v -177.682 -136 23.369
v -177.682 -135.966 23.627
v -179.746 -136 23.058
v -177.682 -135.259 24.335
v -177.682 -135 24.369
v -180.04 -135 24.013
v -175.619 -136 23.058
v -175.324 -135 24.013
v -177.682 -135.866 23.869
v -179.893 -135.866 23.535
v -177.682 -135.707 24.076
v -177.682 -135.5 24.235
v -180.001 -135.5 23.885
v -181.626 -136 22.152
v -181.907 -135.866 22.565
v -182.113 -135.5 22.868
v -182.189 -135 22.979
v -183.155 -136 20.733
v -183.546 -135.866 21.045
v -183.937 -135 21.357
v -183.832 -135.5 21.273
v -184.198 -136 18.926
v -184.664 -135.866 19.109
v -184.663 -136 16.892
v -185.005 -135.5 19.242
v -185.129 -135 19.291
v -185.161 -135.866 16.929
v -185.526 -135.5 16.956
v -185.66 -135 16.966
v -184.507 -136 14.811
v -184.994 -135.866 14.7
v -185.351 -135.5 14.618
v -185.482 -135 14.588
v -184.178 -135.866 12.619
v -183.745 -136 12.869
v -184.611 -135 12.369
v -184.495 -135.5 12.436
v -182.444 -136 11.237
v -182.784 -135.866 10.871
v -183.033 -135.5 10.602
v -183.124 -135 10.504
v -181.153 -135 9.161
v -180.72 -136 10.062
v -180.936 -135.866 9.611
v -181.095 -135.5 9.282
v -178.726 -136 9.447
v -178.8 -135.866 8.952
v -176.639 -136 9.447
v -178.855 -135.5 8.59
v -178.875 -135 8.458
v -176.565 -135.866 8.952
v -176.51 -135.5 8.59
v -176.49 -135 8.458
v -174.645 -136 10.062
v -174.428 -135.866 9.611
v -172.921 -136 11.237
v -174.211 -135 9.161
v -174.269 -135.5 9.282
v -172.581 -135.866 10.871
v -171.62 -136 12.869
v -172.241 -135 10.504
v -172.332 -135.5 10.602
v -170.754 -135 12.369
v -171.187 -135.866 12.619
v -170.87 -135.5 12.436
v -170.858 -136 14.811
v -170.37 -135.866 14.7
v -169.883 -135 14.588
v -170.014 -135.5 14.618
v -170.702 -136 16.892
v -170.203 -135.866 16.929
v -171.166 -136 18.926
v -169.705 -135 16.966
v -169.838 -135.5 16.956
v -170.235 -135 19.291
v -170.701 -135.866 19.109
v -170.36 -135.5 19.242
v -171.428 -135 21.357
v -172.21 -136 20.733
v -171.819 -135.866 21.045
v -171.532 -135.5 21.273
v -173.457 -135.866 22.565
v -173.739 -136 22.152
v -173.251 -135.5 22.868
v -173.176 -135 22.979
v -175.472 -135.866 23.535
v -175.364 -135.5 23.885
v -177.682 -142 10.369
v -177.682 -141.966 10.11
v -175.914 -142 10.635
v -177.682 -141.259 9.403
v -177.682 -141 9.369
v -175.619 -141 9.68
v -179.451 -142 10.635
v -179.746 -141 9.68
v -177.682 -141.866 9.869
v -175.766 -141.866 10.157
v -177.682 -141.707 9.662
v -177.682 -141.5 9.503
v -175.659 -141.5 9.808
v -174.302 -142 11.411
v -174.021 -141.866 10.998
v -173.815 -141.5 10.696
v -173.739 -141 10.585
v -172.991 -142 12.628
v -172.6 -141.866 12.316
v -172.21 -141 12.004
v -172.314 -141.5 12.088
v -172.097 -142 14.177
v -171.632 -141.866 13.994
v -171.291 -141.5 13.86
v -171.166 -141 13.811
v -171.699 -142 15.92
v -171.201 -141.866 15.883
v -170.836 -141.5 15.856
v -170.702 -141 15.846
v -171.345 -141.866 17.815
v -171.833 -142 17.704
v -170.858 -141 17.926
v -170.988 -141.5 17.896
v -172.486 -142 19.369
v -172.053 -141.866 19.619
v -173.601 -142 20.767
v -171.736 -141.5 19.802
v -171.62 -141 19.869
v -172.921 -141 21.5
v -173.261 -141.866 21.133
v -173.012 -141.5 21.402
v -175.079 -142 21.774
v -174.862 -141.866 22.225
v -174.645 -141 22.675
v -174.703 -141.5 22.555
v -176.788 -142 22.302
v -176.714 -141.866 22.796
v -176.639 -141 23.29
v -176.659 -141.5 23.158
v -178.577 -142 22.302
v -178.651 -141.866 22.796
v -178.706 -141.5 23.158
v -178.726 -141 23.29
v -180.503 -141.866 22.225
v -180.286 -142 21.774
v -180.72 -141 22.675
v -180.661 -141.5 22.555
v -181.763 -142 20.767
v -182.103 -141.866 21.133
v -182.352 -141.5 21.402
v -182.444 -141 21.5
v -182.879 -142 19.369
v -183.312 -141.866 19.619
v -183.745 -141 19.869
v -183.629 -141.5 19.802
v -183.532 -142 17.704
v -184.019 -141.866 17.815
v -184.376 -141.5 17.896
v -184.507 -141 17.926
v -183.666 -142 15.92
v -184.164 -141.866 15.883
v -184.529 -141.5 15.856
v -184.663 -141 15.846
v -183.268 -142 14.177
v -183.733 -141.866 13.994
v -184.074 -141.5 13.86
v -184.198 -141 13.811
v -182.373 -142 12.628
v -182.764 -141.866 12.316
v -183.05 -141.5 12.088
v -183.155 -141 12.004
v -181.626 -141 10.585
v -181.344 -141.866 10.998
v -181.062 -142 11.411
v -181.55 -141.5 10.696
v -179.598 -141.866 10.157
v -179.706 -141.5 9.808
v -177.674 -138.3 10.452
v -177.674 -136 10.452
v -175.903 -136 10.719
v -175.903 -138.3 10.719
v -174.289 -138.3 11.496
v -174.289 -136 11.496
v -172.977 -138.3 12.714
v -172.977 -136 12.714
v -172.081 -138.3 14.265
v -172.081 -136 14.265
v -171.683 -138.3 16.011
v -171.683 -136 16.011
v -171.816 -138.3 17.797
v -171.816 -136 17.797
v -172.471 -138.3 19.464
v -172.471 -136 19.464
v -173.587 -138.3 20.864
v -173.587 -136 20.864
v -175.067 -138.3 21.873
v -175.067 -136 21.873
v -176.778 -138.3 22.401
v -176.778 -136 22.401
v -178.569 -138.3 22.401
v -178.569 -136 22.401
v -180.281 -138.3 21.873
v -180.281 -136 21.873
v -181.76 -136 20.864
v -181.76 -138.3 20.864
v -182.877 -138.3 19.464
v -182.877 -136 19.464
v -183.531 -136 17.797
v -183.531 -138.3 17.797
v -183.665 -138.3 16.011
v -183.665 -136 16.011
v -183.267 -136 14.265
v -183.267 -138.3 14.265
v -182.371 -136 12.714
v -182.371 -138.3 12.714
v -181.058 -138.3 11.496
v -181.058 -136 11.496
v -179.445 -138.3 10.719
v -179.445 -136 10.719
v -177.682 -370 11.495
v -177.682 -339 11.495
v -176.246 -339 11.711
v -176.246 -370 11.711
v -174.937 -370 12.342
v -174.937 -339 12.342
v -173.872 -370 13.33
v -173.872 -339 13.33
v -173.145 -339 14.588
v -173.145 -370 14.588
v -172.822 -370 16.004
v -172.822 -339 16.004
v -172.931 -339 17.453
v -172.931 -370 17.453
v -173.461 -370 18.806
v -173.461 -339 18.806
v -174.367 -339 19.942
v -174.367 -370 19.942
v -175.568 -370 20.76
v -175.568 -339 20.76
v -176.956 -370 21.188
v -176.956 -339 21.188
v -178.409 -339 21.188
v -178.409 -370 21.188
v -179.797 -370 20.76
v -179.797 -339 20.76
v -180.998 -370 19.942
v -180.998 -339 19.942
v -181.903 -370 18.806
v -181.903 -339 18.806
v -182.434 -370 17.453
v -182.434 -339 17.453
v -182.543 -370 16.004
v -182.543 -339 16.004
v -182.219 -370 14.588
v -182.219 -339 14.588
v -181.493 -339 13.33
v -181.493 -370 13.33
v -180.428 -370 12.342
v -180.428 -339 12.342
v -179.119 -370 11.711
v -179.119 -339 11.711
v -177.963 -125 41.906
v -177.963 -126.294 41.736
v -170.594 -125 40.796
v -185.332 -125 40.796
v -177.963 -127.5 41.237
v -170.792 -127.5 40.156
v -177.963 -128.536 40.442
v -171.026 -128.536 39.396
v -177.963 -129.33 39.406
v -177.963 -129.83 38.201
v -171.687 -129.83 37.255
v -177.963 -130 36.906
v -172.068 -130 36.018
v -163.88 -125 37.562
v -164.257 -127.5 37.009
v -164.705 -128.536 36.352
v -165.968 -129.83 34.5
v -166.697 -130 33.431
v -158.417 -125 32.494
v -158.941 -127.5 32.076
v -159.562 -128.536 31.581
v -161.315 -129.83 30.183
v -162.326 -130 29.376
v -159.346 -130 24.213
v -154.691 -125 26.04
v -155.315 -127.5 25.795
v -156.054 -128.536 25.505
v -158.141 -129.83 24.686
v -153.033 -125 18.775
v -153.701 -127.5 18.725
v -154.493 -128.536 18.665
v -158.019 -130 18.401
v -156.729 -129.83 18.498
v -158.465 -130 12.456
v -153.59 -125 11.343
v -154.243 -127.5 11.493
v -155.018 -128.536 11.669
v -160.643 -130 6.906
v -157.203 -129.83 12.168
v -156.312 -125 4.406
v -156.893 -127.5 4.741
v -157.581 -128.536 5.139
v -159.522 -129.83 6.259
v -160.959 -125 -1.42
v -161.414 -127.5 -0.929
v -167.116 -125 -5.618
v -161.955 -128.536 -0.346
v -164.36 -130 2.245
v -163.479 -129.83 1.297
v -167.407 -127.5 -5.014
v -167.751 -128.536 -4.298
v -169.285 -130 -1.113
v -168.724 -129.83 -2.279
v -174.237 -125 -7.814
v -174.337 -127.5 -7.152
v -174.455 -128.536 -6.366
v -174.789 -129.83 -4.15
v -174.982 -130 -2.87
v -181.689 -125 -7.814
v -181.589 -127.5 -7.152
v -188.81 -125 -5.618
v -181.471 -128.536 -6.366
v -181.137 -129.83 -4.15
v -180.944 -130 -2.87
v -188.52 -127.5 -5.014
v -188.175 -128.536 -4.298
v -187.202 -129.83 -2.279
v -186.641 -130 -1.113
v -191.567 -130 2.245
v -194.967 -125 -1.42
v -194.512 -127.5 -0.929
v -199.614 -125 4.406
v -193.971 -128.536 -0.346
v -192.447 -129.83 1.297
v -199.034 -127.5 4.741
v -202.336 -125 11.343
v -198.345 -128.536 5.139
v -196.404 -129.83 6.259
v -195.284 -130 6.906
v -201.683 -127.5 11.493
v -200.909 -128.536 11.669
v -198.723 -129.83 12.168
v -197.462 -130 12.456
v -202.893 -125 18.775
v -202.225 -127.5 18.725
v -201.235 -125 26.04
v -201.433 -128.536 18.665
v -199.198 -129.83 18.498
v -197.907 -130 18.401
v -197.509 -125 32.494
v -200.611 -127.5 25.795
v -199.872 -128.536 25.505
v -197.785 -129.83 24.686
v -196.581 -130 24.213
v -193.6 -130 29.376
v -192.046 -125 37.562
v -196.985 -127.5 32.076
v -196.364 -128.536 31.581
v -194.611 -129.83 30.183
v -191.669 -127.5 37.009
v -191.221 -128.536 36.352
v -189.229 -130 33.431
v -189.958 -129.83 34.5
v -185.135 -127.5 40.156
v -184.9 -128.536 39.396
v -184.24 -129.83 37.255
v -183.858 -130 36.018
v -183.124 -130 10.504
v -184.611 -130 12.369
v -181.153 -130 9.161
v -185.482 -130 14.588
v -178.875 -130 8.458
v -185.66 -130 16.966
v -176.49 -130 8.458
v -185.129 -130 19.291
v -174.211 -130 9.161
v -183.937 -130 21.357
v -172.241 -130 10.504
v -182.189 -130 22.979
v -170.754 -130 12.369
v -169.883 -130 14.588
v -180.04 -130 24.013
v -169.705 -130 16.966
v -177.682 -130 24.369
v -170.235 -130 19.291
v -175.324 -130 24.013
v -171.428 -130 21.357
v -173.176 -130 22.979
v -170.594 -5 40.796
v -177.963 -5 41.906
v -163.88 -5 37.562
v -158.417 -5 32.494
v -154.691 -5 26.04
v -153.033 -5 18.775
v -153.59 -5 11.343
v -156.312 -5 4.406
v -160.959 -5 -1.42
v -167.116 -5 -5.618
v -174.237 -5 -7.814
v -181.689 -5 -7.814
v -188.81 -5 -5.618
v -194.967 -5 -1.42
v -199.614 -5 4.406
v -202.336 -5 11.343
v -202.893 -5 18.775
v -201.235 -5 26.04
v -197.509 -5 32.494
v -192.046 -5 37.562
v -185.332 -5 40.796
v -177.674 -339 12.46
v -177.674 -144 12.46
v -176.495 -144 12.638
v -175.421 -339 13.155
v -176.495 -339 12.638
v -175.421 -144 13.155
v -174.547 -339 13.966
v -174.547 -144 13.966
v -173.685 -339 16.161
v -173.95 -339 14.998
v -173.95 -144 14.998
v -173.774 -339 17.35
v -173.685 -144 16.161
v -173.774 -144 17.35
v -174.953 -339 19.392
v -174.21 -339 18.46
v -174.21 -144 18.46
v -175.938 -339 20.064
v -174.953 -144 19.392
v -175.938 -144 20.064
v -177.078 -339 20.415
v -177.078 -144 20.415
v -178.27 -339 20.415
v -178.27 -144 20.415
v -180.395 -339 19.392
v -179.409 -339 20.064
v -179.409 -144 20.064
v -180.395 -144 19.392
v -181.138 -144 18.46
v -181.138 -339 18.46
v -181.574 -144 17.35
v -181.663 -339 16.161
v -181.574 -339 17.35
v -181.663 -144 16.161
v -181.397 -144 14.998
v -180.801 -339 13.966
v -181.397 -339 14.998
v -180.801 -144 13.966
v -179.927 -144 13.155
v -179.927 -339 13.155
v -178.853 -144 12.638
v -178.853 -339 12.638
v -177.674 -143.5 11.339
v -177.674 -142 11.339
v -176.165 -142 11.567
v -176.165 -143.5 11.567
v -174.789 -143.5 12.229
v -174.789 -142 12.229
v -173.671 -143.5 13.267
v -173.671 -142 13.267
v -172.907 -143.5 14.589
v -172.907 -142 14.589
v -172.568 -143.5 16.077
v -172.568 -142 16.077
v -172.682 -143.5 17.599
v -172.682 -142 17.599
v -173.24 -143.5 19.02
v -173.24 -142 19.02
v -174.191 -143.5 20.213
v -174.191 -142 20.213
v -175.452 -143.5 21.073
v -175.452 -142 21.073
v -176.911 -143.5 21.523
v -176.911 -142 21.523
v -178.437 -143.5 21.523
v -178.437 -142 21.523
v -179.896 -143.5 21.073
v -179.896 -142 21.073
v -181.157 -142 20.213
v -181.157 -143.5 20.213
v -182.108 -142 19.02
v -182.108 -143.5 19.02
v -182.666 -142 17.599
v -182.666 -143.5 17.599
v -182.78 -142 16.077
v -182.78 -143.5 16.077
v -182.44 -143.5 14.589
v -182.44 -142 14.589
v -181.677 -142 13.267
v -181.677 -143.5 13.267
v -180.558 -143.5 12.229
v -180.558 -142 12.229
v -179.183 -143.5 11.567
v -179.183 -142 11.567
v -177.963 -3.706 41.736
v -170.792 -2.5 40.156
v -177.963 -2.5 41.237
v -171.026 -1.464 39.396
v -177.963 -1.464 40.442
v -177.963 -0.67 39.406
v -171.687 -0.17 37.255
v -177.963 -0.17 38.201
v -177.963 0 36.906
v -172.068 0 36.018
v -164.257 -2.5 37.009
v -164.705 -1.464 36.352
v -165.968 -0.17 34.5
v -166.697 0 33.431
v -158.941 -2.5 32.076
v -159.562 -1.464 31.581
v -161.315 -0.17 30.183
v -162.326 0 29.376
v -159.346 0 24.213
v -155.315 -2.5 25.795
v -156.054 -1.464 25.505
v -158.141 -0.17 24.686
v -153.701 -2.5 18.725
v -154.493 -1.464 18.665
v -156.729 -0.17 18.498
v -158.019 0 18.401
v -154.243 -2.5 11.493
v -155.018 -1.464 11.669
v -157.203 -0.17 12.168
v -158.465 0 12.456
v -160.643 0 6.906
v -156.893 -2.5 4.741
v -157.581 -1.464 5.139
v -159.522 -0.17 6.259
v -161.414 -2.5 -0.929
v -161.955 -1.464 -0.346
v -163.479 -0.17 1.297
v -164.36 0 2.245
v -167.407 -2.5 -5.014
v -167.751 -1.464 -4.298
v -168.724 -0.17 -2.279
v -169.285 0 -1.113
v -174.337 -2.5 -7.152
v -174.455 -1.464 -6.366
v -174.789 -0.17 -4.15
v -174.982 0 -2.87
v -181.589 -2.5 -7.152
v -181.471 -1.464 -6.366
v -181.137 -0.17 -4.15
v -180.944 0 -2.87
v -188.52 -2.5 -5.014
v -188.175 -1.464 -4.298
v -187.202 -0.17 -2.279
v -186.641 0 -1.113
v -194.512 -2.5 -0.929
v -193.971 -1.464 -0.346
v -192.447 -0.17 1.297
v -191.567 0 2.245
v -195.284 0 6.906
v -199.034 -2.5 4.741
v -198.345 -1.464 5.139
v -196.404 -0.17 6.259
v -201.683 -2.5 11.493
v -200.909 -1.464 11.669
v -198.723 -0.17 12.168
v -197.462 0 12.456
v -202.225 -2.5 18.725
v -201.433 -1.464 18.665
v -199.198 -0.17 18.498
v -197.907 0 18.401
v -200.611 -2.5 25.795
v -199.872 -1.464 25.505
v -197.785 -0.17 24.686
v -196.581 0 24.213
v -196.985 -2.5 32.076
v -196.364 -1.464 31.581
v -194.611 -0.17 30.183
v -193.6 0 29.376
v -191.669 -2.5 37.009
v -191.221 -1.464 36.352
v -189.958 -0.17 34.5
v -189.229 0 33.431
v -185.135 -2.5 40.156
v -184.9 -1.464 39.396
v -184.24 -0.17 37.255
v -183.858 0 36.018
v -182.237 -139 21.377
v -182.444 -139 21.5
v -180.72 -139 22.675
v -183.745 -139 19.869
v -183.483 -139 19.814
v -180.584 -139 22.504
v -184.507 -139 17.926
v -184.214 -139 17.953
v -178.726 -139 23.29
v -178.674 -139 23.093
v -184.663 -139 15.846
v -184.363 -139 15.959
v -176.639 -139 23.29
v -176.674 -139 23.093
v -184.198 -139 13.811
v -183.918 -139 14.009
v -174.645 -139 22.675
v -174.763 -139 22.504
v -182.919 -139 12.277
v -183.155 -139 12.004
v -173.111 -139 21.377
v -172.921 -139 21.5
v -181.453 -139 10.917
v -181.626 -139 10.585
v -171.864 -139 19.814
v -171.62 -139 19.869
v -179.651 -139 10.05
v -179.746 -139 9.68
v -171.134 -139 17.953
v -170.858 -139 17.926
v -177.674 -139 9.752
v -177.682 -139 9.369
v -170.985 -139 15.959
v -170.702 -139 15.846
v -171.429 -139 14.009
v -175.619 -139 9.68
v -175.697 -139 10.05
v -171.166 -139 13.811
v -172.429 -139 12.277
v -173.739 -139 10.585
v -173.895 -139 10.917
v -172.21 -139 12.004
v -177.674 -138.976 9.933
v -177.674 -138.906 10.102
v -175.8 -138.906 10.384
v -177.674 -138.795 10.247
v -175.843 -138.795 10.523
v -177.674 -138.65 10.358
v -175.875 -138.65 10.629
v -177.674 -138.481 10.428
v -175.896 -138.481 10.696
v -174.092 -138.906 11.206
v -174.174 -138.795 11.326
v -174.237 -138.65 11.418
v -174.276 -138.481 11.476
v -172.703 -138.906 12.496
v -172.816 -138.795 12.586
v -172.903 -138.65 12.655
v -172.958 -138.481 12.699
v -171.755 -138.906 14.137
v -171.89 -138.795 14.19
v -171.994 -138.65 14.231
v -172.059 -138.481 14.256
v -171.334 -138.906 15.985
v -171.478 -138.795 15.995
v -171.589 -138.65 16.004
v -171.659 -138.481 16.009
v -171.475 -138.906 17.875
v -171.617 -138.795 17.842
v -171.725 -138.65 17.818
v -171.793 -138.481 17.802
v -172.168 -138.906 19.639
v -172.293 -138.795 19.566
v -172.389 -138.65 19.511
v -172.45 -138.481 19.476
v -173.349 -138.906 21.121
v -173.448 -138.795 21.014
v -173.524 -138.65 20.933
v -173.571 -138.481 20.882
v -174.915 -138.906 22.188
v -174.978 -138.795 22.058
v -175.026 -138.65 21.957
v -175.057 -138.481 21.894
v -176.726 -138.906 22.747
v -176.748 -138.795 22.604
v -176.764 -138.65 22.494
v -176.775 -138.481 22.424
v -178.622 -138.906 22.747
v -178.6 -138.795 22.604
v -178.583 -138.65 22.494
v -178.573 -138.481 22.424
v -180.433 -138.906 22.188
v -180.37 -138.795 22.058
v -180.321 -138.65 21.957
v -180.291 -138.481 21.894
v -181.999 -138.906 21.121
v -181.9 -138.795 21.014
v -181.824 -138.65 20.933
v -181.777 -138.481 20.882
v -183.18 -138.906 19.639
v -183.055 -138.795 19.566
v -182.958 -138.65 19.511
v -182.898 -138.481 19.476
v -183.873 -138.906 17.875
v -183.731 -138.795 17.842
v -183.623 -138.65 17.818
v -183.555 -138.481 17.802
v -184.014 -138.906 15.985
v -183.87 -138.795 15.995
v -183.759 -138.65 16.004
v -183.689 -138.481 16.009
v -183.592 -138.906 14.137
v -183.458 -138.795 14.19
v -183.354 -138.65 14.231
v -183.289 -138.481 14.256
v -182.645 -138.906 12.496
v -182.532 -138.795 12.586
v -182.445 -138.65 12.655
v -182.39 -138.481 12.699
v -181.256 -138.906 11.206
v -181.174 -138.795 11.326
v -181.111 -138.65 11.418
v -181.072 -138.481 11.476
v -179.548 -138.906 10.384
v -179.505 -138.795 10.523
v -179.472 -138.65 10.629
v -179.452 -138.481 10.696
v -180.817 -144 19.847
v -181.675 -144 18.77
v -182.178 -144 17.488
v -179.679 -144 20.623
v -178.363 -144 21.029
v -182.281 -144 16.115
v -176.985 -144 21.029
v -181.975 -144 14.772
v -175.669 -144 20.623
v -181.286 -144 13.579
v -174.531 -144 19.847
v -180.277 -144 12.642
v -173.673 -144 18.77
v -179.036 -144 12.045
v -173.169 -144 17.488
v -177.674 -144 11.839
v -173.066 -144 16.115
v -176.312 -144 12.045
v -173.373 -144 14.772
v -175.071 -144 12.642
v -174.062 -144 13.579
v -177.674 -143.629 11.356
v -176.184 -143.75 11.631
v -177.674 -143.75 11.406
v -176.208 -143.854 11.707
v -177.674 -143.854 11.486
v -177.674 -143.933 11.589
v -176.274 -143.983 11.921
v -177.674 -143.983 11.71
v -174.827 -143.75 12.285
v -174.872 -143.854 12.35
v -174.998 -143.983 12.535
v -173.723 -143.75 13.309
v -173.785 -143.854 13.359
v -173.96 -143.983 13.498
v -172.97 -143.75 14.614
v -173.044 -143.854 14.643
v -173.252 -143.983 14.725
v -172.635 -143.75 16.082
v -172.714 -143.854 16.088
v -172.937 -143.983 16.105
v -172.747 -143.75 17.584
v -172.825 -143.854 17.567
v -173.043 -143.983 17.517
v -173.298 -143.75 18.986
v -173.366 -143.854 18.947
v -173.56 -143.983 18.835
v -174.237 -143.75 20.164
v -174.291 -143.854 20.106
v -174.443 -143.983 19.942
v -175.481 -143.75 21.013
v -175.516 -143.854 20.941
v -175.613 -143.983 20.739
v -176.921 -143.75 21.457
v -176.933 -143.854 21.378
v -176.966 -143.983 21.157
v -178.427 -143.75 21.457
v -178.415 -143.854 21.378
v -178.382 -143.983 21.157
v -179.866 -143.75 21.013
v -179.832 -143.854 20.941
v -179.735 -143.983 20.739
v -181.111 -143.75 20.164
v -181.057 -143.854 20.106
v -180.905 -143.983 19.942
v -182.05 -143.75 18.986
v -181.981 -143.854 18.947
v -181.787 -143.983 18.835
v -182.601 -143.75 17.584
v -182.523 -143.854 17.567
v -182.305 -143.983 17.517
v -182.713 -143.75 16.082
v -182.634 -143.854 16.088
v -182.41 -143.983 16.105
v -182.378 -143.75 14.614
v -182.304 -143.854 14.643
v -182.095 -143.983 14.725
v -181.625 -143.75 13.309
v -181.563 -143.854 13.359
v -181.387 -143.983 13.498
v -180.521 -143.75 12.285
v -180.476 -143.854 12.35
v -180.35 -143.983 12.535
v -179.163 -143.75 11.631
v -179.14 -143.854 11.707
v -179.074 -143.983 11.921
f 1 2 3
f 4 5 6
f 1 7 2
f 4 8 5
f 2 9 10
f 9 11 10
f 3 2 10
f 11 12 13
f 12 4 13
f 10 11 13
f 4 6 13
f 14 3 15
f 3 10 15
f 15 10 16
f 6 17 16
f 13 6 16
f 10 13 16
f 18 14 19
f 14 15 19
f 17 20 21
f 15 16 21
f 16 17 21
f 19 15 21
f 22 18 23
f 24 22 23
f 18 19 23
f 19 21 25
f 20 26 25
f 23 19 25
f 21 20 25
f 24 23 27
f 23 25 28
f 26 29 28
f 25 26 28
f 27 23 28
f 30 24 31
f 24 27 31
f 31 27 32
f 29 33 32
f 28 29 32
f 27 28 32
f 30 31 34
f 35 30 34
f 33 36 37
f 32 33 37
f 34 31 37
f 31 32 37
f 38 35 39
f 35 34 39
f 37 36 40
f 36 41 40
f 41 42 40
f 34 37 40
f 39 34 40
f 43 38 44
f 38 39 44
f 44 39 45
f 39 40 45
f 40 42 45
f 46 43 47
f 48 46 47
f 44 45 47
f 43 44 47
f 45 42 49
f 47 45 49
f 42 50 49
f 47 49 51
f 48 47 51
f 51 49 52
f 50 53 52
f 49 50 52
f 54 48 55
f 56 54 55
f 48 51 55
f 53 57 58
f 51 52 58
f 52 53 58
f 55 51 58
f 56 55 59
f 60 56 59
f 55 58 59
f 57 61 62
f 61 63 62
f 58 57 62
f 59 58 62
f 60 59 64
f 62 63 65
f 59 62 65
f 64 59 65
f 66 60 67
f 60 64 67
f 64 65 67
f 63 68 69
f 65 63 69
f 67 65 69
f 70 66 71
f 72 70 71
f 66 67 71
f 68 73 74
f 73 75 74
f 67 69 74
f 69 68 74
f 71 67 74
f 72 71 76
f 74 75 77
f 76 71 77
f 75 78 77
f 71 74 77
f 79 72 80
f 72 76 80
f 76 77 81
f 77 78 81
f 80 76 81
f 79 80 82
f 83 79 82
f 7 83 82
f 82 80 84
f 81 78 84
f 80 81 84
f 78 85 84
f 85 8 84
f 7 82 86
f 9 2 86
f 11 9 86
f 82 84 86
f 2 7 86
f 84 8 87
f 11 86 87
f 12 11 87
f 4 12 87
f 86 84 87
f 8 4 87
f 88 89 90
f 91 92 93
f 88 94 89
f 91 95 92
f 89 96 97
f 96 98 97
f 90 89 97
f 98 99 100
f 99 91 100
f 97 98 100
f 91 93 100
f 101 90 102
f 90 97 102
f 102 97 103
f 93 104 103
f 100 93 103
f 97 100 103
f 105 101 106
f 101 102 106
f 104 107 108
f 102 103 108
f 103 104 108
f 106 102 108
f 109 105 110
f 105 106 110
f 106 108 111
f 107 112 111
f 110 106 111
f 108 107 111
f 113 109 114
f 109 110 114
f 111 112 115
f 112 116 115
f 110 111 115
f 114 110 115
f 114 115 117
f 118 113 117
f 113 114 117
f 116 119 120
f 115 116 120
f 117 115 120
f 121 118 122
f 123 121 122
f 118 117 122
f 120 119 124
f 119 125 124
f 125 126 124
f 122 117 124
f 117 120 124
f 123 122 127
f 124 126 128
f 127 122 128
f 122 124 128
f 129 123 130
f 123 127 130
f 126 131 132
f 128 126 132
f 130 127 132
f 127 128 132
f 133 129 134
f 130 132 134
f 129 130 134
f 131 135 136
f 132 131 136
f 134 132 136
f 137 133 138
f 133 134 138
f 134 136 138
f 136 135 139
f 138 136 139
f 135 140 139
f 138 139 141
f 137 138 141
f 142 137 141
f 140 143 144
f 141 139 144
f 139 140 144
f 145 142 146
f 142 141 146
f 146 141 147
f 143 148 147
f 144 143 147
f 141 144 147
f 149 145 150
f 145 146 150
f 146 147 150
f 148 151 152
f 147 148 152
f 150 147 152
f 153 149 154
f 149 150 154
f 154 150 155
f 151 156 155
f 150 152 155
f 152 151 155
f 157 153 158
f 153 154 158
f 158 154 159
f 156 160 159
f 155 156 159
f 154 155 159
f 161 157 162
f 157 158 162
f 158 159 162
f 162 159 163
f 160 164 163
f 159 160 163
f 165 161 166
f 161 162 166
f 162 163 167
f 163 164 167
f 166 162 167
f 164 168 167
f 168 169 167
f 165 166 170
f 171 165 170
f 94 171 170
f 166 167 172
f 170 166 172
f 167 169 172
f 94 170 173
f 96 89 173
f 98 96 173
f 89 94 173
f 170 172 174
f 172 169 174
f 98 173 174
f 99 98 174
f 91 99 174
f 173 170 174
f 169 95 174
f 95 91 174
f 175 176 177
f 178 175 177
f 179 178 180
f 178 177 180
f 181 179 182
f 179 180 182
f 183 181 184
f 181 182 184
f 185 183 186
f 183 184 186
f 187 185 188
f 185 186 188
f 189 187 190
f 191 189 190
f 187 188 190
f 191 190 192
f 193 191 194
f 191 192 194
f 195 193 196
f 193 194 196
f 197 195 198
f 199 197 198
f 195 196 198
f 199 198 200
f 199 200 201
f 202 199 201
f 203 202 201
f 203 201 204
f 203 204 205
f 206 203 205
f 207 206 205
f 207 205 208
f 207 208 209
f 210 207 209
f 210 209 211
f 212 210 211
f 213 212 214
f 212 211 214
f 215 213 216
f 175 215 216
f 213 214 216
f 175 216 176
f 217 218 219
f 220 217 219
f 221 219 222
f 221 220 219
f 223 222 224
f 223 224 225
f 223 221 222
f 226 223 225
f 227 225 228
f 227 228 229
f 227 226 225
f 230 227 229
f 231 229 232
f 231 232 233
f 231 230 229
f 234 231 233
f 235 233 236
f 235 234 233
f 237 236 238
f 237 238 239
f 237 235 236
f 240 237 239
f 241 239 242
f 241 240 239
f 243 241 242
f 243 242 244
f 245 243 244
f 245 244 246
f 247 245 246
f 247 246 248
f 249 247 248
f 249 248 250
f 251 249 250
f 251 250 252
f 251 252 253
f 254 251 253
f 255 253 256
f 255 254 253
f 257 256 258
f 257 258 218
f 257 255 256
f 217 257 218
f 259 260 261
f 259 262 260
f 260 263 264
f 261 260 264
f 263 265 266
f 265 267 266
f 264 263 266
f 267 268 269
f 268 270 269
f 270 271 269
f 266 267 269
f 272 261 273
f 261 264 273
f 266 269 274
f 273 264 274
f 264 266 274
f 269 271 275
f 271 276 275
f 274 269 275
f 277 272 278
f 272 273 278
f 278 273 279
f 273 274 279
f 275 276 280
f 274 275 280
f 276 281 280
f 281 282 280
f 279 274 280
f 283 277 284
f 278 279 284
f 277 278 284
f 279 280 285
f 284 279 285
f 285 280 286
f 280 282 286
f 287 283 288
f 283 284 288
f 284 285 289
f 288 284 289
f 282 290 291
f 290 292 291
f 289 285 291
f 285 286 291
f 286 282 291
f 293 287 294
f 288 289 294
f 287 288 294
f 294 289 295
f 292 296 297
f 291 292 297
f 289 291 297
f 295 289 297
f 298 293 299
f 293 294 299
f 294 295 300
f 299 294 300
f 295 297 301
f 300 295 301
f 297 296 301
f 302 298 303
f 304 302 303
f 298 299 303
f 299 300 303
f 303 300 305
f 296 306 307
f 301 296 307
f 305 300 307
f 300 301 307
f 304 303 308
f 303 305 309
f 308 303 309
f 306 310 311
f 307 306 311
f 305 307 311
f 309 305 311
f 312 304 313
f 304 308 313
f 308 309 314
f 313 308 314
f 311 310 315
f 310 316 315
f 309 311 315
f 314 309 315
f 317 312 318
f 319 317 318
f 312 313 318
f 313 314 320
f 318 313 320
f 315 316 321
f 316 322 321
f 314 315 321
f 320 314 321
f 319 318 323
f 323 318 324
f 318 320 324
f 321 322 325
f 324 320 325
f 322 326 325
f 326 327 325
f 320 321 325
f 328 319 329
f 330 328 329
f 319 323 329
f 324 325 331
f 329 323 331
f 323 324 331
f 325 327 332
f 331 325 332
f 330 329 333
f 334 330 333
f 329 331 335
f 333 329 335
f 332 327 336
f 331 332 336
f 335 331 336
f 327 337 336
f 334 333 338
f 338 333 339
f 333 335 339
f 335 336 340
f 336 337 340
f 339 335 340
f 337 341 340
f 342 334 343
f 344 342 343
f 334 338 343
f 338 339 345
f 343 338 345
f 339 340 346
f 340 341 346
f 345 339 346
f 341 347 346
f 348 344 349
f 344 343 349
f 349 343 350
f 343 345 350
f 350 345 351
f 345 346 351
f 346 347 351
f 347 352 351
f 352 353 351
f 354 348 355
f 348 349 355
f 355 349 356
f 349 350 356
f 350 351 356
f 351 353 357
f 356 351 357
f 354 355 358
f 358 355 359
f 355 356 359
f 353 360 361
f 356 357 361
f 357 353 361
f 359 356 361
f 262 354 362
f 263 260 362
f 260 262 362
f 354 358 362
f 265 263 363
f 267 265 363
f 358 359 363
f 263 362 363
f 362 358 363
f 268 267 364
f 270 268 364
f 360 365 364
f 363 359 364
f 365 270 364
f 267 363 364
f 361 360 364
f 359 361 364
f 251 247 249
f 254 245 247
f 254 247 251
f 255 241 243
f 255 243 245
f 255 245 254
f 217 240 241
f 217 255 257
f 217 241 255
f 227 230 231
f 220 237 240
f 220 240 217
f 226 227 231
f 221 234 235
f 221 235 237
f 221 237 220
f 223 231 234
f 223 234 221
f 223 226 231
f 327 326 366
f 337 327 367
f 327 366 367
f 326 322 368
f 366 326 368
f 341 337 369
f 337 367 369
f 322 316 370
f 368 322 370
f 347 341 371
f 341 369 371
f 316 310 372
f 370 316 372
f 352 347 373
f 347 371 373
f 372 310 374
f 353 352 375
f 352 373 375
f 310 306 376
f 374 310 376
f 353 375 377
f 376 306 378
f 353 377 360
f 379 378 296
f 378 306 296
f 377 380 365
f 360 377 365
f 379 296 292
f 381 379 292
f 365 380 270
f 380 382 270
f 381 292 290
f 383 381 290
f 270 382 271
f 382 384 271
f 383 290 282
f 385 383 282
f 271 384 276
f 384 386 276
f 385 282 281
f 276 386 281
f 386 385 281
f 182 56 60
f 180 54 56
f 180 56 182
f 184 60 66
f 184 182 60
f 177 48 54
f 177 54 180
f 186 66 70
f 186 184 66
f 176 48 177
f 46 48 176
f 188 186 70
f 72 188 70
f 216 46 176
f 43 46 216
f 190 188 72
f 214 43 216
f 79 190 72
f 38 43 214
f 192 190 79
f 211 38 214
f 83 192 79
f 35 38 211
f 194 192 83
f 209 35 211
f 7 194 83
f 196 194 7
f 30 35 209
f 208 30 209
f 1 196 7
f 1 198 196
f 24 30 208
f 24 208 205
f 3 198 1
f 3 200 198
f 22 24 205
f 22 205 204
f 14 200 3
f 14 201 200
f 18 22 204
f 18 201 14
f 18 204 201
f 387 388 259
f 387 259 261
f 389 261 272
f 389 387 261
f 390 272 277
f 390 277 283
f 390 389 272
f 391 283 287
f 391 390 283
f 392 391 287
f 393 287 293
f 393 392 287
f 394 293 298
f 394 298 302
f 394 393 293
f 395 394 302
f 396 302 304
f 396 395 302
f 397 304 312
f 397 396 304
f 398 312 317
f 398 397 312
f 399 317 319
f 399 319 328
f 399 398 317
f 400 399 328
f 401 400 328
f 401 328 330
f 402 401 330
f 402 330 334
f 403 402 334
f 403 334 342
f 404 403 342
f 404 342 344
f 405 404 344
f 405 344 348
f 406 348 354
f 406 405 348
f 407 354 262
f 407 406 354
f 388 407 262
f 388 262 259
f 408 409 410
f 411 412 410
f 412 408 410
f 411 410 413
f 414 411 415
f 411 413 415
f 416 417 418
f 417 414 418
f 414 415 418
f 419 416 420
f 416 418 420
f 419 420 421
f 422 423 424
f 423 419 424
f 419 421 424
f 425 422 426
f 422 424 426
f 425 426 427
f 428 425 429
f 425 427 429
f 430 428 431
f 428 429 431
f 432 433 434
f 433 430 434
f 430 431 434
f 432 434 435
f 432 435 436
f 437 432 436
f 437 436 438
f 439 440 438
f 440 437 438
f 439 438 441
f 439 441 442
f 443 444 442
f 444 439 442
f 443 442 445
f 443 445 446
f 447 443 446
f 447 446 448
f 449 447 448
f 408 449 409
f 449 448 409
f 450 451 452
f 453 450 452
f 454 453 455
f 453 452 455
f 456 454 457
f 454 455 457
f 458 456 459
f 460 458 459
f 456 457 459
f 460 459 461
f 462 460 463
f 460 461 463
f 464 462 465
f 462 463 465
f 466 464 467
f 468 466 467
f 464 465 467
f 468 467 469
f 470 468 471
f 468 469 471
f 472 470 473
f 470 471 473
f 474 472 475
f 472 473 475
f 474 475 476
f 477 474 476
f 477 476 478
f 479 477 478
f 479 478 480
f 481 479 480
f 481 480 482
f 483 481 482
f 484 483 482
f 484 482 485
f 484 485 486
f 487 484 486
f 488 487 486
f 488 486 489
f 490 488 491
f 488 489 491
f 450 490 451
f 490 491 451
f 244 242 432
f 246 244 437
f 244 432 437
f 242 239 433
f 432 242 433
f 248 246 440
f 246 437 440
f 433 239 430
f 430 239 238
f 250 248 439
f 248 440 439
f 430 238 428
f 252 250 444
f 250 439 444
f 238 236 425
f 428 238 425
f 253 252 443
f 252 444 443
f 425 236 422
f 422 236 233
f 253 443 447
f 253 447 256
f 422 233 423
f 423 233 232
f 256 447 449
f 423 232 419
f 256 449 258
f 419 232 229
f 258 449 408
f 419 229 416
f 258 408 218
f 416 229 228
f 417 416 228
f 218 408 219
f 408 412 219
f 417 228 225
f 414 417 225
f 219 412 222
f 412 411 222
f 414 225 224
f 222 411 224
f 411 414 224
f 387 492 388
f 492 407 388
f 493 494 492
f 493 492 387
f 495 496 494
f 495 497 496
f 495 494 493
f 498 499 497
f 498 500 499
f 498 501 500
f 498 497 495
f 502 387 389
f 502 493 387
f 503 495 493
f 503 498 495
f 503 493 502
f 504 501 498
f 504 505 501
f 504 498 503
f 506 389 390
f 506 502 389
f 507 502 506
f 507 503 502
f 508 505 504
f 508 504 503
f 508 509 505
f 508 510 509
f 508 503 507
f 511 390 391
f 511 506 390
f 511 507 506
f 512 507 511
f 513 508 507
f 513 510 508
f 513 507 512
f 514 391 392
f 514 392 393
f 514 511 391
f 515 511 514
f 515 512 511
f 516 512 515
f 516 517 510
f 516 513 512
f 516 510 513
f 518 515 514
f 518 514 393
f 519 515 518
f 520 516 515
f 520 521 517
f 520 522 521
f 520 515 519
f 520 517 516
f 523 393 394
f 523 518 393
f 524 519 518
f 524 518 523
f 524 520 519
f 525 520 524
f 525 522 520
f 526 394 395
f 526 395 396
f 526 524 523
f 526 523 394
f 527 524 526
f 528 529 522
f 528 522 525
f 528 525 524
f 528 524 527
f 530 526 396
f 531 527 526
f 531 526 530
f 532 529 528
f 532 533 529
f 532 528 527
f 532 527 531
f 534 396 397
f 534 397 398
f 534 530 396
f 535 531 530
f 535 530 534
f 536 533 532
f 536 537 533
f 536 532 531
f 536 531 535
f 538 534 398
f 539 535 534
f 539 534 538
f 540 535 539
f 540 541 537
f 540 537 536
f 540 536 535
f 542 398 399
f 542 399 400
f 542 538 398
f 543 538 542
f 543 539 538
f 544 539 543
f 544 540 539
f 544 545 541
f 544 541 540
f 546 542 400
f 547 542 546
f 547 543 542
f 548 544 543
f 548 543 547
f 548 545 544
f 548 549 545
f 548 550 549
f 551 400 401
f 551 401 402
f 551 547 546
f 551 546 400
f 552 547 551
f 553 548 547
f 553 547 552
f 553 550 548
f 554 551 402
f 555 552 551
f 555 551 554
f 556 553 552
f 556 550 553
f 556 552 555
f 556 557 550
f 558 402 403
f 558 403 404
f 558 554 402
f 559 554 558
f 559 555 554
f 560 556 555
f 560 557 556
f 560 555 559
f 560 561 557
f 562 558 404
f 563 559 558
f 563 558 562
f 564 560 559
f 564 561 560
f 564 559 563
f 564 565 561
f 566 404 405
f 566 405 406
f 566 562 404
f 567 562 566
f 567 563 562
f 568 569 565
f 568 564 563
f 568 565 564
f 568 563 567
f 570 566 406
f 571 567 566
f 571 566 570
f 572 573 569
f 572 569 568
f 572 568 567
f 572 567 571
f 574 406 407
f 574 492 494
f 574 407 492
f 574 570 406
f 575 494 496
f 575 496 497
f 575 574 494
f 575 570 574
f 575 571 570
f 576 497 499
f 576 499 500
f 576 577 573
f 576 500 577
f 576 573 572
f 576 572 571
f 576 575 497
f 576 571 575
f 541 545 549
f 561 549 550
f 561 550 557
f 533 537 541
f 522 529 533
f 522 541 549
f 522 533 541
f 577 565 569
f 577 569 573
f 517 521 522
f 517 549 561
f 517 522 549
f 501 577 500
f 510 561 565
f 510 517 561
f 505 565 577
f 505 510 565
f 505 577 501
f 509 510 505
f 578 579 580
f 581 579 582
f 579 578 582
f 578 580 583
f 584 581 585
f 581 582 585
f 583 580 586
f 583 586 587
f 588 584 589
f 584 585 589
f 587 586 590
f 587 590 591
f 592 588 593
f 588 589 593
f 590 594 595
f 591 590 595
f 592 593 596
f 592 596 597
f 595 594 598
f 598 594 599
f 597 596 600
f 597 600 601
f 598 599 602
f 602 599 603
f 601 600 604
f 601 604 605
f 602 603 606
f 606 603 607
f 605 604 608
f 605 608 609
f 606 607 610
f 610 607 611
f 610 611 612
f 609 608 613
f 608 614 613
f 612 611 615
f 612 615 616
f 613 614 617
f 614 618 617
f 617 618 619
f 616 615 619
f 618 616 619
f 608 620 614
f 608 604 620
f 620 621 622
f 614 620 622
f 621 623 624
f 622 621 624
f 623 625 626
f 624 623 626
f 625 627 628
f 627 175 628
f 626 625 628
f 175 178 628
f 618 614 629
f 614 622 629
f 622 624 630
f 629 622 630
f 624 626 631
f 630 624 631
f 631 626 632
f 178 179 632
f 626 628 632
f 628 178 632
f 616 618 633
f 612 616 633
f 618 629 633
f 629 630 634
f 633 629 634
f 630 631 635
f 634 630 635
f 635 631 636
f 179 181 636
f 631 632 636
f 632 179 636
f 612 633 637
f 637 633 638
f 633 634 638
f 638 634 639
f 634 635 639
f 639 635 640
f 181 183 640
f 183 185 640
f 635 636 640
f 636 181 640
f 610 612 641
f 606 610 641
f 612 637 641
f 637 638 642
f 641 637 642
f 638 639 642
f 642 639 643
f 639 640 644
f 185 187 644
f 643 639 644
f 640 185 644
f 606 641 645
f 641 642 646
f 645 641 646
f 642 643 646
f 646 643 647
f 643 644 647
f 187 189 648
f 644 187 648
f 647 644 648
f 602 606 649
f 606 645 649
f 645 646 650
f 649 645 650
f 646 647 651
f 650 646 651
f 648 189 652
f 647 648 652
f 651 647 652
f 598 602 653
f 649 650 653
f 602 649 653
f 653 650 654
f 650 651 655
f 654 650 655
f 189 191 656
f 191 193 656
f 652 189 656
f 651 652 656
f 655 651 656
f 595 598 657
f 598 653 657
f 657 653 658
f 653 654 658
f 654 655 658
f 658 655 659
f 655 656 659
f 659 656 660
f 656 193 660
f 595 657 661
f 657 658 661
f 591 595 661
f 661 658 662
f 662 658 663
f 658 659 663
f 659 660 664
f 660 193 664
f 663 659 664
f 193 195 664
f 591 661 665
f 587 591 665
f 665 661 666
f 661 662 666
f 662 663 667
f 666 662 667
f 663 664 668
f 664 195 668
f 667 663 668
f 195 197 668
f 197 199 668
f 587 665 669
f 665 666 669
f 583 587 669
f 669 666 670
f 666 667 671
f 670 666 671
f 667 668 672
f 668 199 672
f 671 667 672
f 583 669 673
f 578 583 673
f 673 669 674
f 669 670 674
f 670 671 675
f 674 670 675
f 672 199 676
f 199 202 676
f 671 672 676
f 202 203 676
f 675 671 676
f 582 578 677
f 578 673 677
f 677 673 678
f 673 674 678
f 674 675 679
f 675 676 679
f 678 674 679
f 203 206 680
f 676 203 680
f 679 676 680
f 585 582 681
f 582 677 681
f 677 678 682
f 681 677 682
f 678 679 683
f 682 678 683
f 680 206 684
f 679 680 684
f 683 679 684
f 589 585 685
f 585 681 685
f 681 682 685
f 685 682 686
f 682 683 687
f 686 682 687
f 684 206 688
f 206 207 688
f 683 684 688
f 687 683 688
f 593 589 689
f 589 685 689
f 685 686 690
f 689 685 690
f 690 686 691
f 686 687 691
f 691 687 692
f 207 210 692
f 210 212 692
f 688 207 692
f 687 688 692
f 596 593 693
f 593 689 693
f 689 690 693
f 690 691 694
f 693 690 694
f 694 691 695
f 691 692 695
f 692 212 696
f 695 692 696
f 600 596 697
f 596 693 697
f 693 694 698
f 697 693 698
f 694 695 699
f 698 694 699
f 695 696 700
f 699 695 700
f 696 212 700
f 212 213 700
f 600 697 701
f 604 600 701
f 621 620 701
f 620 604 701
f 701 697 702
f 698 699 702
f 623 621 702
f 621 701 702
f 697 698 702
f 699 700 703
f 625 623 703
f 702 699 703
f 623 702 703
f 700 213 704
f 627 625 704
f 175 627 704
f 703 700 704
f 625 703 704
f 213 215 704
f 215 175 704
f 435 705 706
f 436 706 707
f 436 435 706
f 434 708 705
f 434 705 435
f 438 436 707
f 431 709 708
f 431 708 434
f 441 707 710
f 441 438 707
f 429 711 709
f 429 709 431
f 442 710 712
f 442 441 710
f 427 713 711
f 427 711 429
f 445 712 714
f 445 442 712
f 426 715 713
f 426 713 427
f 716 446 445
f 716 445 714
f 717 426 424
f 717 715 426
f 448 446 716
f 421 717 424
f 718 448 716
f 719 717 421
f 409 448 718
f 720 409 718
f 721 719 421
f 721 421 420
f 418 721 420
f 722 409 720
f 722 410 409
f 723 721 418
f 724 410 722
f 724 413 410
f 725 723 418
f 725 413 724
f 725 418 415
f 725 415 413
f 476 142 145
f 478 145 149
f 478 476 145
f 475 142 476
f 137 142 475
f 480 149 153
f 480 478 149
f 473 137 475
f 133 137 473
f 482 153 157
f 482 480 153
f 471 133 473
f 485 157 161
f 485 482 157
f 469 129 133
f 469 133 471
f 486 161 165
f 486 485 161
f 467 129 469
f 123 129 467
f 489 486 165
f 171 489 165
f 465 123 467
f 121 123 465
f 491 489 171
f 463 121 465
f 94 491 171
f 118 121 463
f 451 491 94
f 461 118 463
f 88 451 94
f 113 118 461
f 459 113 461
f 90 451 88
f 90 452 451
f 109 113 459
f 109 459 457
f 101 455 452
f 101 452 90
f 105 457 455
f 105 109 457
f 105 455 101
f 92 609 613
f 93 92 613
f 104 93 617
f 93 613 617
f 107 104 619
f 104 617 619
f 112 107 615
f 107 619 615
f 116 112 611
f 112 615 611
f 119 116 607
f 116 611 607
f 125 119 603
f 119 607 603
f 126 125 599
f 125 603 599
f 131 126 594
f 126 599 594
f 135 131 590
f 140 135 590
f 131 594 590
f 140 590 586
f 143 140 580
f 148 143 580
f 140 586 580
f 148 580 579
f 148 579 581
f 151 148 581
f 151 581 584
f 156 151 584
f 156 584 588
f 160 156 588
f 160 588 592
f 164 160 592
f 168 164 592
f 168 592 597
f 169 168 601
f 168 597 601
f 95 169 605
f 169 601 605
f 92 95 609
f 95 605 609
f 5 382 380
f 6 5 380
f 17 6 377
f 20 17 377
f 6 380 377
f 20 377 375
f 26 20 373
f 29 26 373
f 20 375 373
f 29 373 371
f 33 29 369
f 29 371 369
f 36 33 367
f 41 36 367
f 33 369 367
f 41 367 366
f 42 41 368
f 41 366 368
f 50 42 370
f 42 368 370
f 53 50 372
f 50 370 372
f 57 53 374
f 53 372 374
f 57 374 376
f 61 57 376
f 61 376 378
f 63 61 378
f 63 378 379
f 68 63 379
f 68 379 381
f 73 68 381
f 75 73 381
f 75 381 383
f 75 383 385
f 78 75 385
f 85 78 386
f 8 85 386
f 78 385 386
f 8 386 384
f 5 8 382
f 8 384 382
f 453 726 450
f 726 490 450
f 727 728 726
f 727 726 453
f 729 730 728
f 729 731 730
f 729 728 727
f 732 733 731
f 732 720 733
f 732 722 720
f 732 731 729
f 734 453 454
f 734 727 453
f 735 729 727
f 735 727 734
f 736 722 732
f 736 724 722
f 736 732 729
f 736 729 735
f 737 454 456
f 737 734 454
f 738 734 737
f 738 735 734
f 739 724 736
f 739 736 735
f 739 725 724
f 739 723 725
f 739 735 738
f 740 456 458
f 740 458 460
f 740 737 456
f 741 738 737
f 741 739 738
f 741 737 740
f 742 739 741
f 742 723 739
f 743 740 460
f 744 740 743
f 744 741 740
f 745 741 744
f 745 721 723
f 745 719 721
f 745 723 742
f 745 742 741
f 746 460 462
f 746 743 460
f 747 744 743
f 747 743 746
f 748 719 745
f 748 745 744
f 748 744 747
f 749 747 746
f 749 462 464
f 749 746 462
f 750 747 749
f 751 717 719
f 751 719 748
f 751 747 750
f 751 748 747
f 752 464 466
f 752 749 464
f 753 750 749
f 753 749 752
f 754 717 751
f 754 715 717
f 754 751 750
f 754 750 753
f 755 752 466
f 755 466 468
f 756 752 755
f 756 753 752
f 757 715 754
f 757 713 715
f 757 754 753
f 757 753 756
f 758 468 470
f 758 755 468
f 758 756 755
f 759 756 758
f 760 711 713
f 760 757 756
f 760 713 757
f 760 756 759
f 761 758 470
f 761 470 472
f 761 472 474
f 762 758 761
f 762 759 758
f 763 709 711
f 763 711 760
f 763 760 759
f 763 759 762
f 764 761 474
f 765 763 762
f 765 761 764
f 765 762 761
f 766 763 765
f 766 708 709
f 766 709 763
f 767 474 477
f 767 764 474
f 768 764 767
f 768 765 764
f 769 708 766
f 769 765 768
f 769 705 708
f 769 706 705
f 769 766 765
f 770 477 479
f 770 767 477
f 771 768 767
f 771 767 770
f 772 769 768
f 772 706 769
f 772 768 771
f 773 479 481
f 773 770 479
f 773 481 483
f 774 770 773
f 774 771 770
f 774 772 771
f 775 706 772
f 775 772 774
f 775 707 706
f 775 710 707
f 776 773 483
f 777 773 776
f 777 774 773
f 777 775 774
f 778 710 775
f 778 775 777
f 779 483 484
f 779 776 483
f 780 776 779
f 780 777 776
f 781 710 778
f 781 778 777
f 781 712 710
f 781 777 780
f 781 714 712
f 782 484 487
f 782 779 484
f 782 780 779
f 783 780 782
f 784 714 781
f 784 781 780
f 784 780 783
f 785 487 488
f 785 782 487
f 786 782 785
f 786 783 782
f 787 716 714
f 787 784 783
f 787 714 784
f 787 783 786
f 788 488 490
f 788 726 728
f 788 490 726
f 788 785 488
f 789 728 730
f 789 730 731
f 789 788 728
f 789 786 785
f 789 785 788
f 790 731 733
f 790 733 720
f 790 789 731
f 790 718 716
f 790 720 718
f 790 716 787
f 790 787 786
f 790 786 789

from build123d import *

# Parameters (mm, degrees)
SKETCH1_R           = 25
BOSS_EXTRUDE1_DEPTH = 130
SKETCH2_R           = 4
BOSS_EXTRUDE2_DEPTH = 240
FILLET1_R           = 5
SKETCH3_R           = 1.453879909
BOSS_EXTRUDE3_DEPTH = 11
SKETCH5_R           = 4.874031528
BOSS_EXTRUDE4_DEPTH = 31
SKETCH4_R           = 8
BOSS_EXTRUDE5_DEPTH = 6
SKETCH6_R           = 6.008121905
BOSS_EXTRUDE6_DEPTH = 3
SKETCH7_R           = 7
BOSS_EXTRUDE7_DEPTH = 3
SKETCH8_R           = 5.120351742
BOSS_EXTRUDE8_DEPTH = 2
FILLET2_R           = 1
FILLET3_R           = 0.7
FILLET4_R           = 0.5


with BuildPart() as part:
    # Sketch1 → Boss-Extrude1 (new body)
    with BuildSketch(Plane(origin=(0, 0, 0), x_dir=(1, 0, 0), z_dir=(0, 1, 0))):
        with Locations(Location((-177.963076726, -16.906492289, 0), (0, 0, 270))):
            Circle(SKETCH1_R)
    extrude(amount=-BOSS_EXTRUDE1_DEPTH)

    # Sketch2 → Boss-Extrude2 (add)
    with BuildSketch(Plane.XZ.offset(130)):
        with Locations(Location((-177.673880688, 16.459807513, 0), (0, 0, 270))):
            Circle(SKETCH2_R)
    extrude(amount=BOSS_EXTRUDE2_DEPTH)

    # Fillet1
    fillet1_edges = [part.edges().sort_by_distance(p)[0] for p in [
        (-177.963076726, 0, -8.093507711),
        (-177.963076726, -130, -8.093507711),
    ]]
    fillet(fillet1_edges, radius=FILLET1_R)

    # Sketch3 → Boss-Extrude3 (add)
    with BuildSketch(Plane.XZ.offset(370)):
        with Locations((-177.696828735, 16.529309624)):
            Circle(SKETCH3_R)
    extrude(amount=-BOSS_EXTRUDE3_DEPTH)

    # Sketch5 → Boss-Extrude4 (add)
    with BuildSketch(Plane.XZ.offset(370)):
        with Locations(Location((-177.682359617, 16.368630896, 0), (0, 0, 270))):
            Circle(SKETCH5_R)
    extrude(amount=-BOSS_EXTRUDE4_DEPTH)

    # Sketch4 → Boss-Extrude5 (add)
    with BuildSketch(Plane.XZ.offset(130)):
        with Locations(Location((-177.682359617, 16.368630896, 0), (0, 0, 90))):
            Circle(SKETCH4_R)
    extrude(amount=BOSS_EXTRUDE5_DEPTH)

    # Sketch6 → Boss-Extrude6 (add)
    with BuildSketch(Plane.XZ.offset(136)):
        with Locations(Location((-177.673880688, 16.459807513, 0), (0, 0, 270))):
            Circle(SKETCH6_R)
    extrude(amount=BOSS_EXTRUDE6_DEPTH)

    # Sketch7 → Boss-Extrude7 (add)
    with BuildSketch(Plane.XZ.offset(139)):
        with Locations(Location((-177.682359617, 16.368630896, 0), (0, 0, 270))):
            Circle(SKETCH7_R)
    extrude(amount=BOSS_EXTRUDE7_DEPTH)

    # Sketch8 → Boss-Extrude8 (add)
    with BuildSketch(Plane.XZ.offset(142)):
        with Locations(Location((-177.673880688, 16.459807513, 0), (0, 0, 270))):
            Circle(SKETCH8_R)
    extrude(amount=BOSS_EXTRUDE8_DEPTH)

    # Fillet2
    fillet2_edges = [part.edges().sort_by_distance(p)[0] for p in [
        (-177.682359617, -136, 8.368630896),
        (-177.682359617, -142, 23.368630896),
    ]]
    fillet(fillet2_edges, radius=FILLET2_R)

    # Fillet3
    fillet3_edges = [part.edges().sort_by_distance(p)[0] for p in [
        (-177.673880688, -139, 22.467929418),
    ]]
    fillet(fillet3_edges, radius=FILLET3_R)

    # Fillet4
    fillet4_edges = [part.edges().sort_by_distance(p)[0] for p in [
        (-177.673880688, -144, 21.580159255),
    ]]
    fillet(fillet4_edges, radius=FILLET4_R)


solid = part.part
